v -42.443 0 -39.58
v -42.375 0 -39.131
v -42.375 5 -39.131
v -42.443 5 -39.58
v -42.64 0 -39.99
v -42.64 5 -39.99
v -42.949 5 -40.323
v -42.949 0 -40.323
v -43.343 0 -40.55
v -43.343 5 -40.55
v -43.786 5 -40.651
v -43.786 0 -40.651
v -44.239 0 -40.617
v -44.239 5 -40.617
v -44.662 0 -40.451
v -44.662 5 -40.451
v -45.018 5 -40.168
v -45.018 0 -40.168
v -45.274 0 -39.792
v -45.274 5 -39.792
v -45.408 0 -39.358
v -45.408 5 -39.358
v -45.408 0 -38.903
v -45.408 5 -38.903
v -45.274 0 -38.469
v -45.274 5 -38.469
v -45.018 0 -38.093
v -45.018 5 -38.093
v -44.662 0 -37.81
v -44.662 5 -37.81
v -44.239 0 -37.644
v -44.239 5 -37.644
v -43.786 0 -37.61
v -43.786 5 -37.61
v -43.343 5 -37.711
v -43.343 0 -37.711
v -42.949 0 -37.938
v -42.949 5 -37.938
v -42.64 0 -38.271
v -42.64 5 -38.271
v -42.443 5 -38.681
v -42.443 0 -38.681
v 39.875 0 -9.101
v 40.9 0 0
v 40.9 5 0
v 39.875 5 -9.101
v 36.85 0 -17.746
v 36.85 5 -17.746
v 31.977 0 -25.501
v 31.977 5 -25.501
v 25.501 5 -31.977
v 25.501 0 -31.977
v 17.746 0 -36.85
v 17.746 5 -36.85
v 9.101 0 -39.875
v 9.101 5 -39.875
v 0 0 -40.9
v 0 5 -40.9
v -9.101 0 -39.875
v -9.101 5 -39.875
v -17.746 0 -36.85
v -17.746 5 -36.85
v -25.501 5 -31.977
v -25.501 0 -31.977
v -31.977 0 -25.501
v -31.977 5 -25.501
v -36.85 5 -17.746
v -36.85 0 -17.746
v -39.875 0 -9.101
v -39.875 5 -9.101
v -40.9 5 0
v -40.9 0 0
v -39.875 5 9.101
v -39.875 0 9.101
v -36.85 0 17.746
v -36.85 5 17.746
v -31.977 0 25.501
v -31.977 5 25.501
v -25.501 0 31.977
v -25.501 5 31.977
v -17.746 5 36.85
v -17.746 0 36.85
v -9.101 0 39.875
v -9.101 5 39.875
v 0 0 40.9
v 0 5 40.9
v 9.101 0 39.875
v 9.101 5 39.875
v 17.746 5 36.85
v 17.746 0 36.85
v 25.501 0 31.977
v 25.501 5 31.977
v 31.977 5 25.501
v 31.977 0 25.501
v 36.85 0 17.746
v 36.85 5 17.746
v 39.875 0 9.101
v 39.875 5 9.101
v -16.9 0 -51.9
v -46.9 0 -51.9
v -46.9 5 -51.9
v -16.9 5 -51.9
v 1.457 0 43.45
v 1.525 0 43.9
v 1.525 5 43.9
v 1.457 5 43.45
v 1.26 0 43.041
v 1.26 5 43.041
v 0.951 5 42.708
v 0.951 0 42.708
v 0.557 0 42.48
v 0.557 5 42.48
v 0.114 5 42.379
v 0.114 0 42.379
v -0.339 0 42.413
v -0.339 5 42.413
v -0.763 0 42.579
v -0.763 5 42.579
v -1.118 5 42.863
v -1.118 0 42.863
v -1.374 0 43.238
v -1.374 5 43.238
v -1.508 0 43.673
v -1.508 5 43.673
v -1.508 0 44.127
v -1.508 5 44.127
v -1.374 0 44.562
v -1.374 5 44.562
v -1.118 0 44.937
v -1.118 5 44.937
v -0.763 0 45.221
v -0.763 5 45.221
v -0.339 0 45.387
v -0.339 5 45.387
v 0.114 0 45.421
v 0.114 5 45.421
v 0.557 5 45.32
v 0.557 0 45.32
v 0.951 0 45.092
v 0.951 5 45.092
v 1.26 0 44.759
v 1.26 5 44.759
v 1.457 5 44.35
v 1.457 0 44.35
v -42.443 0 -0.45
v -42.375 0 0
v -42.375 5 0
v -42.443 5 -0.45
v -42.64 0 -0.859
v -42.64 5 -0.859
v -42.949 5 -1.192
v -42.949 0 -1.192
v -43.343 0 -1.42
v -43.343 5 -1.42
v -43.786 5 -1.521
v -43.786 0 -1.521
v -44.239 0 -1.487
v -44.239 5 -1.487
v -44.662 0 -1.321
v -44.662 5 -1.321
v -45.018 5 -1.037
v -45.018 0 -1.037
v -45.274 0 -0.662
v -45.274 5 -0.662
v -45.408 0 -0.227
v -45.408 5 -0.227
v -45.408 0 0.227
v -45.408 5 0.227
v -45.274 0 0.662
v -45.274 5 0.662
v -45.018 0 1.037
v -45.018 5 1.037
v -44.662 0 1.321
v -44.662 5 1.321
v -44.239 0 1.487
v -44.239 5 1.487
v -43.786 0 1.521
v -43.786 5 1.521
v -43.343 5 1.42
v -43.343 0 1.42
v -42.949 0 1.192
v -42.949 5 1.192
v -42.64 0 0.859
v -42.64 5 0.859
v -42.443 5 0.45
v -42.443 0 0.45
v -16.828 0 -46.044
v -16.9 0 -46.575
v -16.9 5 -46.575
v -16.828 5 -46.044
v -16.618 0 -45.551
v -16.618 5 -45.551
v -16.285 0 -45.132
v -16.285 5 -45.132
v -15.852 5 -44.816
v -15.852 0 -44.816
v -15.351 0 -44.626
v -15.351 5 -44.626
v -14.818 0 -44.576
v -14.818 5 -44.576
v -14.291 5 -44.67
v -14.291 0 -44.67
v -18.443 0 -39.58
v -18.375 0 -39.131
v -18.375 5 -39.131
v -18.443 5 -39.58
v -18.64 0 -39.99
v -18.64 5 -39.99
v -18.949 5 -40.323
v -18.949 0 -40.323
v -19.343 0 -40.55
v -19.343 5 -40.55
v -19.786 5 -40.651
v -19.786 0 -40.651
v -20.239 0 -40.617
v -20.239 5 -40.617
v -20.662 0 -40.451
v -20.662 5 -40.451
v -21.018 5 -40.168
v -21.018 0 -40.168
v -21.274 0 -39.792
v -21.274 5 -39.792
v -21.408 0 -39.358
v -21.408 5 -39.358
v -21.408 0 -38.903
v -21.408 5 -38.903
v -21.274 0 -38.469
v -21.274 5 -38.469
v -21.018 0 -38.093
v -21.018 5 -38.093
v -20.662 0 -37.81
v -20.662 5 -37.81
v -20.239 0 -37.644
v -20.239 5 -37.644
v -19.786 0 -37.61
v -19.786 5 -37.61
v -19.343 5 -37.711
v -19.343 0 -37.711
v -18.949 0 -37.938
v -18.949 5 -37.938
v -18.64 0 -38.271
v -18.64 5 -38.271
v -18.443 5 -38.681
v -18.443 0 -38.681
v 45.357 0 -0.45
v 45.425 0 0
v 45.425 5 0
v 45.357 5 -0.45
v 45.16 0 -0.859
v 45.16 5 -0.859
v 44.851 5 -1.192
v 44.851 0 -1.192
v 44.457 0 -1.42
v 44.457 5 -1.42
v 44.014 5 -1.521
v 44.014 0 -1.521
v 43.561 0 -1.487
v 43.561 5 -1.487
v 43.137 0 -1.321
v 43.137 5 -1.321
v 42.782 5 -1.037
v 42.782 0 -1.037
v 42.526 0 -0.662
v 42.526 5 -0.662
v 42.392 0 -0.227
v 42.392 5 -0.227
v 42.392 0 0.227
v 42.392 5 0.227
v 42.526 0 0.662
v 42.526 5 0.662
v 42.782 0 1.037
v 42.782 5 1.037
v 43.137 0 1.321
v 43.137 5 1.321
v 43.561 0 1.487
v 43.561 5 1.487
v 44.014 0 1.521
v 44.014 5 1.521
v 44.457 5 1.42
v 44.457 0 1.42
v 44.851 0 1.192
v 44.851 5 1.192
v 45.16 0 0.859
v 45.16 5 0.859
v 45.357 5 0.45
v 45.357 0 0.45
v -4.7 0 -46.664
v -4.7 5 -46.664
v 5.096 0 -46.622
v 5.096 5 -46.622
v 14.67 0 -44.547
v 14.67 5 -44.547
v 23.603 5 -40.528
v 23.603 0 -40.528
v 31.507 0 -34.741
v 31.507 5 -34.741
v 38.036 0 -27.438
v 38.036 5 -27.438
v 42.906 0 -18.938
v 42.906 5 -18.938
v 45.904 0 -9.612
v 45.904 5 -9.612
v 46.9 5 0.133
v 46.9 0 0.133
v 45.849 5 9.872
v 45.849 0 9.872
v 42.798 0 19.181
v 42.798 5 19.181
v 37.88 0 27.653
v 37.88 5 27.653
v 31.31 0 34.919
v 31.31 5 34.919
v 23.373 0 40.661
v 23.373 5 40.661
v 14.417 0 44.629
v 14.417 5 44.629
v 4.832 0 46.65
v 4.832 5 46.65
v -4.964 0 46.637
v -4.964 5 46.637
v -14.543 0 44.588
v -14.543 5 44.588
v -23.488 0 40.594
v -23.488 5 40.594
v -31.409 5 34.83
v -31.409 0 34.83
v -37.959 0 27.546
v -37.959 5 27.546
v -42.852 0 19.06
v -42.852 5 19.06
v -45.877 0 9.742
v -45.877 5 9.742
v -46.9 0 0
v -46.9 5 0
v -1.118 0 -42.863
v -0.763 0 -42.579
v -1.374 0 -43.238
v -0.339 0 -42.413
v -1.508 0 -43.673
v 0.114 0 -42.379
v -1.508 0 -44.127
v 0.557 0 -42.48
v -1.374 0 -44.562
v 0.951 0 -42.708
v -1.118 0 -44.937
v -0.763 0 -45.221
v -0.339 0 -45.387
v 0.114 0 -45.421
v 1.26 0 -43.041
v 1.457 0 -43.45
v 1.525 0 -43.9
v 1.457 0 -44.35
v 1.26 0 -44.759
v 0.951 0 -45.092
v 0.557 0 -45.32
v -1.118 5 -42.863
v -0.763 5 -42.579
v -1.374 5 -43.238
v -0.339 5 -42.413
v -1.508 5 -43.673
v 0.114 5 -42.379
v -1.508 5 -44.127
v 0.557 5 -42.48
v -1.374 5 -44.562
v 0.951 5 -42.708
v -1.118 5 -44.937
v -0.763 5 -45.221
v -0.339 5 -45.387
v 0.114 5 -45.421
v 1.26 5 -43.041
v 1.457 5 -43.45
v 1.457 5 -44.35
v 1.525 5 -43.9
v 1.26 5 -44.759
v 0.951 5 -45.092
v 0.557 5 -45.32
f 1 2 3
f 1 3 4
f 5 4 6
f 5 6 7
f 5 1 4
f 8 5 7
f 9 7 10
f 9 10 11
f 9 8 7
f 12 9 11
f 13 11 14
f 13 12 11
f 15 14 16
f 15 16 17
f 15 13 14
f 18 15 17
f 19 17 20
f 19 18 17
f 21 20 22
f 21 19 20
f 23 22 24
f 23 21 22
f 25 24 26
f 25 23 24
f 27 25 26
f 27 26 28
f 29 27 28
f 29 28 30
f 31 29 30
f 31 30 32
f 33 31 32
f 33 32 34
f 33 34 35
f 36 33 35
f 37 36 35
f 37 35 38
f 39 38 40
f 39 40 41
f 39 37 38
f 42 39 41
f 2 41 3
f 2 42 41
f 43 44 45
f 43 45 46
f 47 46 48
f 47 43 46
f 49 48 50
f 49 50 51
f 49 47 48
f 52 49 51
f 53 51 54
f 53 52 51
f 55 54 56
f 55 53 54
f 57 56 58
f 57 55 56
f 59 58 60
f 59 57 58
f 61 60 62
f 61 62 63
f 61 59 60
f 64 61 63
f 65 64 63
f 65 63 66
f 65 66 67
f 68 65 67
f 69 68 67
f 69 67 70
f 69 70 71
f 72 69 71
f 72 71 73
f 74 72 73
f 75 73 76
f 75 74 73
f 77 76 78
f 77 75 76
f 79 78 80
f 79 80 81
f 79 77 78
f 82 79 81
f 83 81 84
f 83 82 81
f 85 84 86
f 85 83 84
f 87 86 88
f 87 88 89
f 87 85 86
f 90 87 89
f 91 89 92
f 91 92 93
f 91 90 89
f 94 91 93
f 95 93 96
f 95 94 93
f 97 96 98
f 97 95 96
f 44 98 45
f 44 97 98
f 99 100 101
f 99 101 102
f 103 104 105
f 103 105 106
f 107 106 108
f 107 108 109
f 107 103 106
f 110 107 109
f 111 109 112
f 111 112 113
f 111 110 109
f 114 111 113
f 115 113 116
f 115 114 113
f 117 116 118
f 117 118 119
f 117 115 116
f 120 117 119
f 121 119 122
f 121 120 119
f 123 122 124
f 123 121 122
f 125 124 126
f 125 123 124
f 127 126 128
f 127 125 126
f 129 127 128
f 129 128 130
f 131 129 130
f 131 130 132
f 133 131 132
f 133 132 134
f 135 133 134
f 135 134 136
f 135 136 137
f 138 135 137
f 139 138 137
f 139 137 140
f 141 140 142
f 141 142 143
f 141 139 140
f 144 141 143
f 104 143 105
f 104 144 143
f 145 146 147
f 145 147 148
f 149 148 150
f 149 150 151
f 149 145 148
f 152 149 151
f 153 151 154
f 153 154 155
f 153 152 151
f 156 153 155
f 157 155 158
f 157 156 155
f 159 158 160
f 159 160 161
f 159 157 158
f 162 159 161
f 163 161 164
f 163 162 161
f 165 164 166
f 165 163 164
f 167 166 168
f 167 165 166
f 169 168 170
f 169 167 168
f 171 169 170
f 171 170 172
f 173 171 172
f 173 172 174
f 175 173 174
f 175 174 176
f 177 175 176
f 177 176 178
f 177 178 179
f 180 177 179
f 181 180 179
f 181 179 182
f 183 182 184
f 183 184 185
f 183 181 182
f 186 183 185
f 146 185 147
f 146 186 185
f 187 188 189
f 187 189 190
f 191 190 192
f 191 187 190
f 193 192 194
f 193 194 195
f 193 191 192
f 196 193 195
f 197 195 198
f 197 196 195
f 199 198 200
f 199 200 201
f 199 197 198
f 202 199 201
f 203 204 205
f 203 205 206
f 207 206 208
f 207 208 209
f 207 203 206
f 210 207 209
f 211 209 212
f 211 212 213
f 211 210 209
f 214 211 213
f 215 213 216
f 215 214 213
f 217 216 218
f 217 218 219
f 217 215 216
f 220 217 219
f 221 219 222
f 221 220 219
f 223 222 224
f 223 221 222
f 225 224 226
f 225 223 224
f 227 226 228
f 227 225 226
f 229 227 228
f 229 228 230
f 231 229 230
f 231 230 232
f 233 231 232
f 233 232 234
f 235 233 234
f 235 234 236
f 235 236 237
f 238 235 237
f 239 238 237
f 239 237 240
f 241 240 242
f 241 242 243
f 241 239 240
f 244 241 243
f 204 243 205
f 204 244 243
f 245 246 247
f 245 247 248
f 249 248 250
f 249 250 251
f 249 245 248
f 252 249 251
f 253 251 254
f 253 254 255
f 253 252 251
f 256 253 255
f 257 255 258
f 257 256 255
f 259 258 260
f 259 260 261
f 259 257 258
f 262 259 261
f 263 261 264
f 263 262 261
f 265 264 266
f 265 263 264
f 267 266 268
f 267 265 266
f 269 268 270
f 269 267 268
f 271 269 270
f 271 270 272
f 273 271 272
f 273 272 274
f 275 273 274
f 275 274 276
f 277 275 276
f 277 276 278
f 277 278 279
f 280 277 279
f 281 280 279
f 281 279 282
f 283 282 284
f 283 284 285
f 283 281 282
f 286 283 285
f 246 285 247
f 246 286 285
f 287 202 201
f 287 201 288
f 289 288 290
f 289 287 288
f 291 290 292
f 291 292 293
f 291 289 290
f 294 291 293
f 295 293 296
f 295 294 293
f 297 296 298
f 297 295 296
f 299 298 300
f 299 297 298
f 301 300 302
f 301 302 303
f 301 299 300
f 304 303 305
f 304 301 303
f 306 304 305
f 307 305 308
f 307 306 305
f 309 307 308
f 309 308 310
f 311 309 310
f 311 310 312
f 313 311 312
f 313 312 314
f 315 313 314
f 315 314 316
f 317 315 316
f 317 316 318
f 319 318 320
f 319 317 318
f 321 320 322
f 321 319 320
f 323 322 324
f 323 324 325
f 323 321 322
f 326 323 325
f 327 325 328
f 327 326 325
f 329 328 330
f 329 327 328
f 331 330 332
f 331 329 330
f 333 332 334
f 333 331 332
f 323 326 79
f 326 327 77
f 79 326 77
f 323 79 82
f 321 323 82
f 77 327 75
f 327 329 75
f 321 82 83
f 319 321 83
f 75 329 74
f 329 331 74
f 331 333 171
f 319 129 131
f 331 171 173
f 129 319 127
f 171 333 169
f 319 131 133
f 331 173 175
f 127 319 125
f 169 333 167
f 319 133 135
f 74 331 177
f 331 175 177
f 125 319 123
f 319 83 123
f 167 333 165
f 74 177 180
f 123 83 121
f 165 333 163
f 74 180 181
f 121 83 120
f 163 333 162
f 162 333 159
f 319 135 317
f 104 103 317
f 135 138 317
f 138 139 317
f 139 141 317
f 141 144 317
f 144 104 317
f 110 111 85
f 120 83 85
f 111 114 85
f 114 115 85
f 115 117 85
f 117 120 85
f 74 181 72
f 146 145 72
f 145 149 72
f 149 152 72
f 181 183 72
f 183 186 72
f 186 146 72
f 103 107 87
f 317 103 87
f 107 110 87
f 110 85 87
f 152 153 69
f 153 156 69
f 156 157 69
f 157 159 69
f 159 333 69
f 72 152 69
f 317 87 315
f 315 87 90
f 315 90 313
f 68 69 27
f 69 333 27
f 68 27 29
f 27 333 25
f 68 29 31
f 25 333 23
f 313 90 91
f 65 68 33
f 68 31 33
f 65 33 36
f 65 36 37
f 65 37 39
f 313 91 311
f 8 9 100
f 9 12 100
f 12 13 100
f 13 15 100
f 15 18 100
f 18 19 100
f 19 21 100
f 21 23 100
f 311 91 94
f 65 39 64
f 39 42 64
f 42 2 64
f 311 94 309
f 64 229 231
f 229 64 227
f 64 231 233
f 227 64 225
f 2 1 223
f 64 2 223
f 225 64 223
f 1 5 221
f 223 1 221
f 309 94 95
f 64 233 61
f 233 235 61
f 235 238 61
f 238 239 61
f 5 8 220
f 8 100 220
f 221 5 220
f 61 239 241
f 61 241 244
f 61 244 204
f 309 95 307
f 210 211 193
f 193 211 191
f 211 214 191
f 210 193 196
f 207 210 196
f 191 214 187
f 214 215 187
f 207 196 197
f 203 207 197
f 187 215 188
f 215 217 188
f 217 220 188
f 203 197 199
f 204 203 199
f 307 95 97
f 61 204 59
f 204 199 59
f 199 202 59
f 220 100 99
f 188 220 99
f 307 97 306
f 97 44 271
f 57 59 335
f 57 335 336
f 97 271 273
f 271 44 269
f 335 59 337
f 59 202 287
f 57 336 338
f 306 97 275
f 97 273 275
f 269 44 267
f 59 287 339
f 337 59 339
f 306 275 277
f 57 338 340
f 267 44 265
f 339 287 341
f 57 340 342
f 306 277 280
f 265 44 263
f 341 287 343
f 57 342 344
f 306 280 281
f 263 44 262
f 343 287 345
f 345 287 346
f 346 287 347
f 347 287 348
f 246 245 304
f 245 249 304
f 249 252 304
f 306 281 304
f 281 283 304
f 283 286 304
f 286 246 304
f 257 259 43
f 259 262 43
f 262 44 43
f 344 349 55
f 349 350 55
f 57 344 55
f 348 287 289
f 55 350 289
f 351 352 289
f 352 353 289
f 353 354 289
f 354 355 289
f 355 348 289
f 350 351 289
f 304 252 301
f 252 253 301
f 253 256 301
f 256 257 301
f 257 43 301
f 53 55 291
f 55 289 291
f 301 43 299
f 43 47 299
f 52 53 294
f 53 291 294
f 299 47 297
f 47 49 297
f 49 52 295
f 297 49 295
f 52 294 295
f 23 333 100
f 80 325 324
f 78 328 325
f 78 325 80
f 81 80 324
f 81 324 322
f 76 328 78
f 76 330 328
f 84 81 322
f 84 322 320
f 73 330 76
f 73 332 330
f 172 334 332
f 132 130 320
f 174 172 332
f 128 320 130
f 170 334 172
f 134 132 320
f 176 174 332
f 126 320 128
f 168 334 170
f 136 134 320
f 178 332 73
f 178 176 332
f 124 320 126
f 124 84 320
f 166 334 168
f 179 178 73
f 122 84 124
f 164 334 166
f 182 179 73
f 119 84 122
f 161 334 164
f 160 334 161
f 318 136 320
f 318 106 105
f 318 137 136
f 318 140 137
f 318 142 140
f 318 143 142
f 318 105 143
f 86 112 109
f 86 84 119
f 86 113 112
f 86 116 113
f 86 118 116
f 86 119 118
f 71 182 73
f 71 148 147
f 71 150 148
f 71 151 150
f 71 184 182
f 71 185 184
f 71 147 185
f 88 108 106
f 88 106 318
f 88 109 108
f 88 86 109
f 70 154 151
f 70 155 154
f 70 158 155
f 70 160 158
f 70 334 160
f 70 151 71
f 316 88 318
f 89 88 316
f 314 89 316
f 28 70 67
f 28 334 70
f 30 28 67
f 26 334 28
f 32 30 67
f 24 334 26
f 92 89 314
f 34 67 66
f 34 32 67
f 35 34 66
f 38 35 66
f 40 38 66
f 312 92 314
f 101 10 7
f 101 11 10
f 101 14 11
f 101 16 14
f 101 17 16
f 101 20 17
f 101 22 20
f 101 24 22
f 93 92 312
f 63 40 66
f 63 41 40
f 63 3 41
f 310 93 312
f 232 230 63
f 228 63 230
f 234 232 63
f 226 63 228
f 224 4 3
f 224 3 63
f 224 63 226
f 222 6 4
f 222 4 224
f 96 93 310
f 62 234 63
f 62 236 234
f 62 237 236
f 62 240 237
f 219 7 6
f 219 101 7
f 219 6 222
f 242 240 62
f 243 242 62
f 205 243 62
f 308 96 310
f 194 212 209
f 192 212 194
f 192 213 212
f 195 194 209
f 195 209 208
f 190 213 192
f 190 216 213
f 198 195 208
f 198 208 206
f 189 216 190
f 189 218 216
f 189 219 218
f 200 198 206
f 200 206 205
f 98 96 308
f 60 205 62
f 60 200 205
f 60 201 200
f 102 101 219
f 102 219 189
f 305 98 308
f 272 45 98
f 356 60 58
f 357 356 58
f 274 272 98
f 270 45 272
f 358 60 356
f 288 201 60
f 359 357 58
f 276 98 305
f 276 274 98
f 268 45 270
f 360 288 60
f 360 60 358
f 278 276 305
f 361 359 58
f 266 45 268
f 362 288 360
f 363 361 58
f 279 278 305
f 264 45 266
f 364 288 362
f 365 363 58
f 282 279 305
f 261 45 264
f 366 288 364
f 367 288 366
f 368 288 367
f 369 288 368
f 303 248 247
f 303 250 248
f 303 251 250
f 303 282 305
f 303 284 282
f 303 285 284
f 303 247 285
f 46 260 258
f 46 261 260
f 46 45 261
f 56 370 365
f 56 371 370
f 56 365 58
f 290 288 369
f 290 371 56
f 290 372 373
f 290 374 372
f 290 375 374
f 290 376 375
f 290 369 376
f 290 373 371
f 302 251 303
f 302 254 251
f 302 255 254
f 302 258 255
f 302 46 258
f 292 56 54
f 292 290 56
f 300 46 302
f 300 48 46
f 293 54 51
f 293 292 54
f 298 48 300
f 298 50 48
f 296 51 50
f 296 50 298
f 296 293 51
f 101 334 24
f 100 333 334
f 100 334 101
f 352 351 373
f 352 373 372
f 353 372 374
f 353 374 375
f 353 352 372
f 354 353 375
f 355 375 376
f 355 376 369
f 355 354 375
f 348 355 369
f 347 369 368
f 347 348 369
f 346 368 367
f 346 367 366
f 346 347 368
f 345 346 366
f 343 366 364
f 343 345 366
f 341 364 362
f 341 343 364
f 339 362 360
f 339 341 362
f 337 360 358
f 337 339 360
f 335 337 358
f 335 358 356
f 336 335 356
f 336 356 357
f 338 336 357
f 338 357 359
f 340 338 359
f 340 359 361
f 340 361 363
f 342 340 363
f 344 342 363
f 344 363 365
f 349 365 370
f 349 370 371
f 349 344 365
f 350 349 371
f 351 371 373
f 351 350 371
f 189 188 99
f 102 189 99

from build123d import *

# Parameters (mm, degrees)
SKETCH_1_R      = 40.9
SKETCH_1_R_2    = 1.525
EXTRUDE_1_DEPTH = 5
SKETCH_3_W      = 30
SKETCH_3_H      = 5
EXTRUDE_2_DEPTH = 5


with BuildPart() as part:
    # 草图1 → 凸台-拉伸1 (new body)
    with BuildSketch(Plane(origin=(0, 0, 0), x_dir=(1, 0, 0), z_dir=(0, 1, 0))):
        with BuildLine():
            Line((-46.9, 0), (-46.9, 46.9))
            Line((-46.9, 46.9), (-16.9, 46.9))
            Line((-16.9, 46.9), (-16.9, 46.574671228))
            ThreePointArc((-16.9, 46.574671228), (-16.079234093, 44.95930534), (-14.290593047, 44.669776699))
            ThreePointArc((-14.290593047, 44.669776699), (37.88033008, -27.65303949), (-46.9, 0))
        make_face()
        Circle(SKETCH_1_R, mode=Mode.SUBTRACT)
        with Locations((-19.9, 39.130550724)):
            Circle(SKETCH_1_R_2, mode=Mode.SUBTRACT)
        with Locations((0, 43.9)):
            Circle(SKETCH_1_R_2, mode=Mode.SUBTRACT)
        with Locations((43.9, 0)):
            Circle(SKETCH_1_R_2, mode=Mode.SUBTRACT)
        with Locations((0, -43.9)):
            Circle(SKETCH_1_R_2, mode=Mode.SUBTRACT)
        with Locations((-43.9, 0)):
            Circle(SKETCH_1_R_2, mode=Mode.SUBTRACT)
        with Locations((-43.9, 39.130550724)):
            Circle(SKETCH_1_R_2, mode=Mode.SUBTRACT)
    extrude(amount=EXTRUDE_1_DEPTH)

    # 草图3 → 凸台-拉伸2 (add)
    with BuildSketch(Plane(origin=(0, 0, 0), x_dir=(1, 0, 0), z_dir=(0, 1, 0))):
        with Locations((-31.9, 49.4)):
            Rectangle(SKETCH_3_W, SKETCH_3_H)
    extrude(amount=EXTRUDE_2_DEPTH)


solid = part.part
